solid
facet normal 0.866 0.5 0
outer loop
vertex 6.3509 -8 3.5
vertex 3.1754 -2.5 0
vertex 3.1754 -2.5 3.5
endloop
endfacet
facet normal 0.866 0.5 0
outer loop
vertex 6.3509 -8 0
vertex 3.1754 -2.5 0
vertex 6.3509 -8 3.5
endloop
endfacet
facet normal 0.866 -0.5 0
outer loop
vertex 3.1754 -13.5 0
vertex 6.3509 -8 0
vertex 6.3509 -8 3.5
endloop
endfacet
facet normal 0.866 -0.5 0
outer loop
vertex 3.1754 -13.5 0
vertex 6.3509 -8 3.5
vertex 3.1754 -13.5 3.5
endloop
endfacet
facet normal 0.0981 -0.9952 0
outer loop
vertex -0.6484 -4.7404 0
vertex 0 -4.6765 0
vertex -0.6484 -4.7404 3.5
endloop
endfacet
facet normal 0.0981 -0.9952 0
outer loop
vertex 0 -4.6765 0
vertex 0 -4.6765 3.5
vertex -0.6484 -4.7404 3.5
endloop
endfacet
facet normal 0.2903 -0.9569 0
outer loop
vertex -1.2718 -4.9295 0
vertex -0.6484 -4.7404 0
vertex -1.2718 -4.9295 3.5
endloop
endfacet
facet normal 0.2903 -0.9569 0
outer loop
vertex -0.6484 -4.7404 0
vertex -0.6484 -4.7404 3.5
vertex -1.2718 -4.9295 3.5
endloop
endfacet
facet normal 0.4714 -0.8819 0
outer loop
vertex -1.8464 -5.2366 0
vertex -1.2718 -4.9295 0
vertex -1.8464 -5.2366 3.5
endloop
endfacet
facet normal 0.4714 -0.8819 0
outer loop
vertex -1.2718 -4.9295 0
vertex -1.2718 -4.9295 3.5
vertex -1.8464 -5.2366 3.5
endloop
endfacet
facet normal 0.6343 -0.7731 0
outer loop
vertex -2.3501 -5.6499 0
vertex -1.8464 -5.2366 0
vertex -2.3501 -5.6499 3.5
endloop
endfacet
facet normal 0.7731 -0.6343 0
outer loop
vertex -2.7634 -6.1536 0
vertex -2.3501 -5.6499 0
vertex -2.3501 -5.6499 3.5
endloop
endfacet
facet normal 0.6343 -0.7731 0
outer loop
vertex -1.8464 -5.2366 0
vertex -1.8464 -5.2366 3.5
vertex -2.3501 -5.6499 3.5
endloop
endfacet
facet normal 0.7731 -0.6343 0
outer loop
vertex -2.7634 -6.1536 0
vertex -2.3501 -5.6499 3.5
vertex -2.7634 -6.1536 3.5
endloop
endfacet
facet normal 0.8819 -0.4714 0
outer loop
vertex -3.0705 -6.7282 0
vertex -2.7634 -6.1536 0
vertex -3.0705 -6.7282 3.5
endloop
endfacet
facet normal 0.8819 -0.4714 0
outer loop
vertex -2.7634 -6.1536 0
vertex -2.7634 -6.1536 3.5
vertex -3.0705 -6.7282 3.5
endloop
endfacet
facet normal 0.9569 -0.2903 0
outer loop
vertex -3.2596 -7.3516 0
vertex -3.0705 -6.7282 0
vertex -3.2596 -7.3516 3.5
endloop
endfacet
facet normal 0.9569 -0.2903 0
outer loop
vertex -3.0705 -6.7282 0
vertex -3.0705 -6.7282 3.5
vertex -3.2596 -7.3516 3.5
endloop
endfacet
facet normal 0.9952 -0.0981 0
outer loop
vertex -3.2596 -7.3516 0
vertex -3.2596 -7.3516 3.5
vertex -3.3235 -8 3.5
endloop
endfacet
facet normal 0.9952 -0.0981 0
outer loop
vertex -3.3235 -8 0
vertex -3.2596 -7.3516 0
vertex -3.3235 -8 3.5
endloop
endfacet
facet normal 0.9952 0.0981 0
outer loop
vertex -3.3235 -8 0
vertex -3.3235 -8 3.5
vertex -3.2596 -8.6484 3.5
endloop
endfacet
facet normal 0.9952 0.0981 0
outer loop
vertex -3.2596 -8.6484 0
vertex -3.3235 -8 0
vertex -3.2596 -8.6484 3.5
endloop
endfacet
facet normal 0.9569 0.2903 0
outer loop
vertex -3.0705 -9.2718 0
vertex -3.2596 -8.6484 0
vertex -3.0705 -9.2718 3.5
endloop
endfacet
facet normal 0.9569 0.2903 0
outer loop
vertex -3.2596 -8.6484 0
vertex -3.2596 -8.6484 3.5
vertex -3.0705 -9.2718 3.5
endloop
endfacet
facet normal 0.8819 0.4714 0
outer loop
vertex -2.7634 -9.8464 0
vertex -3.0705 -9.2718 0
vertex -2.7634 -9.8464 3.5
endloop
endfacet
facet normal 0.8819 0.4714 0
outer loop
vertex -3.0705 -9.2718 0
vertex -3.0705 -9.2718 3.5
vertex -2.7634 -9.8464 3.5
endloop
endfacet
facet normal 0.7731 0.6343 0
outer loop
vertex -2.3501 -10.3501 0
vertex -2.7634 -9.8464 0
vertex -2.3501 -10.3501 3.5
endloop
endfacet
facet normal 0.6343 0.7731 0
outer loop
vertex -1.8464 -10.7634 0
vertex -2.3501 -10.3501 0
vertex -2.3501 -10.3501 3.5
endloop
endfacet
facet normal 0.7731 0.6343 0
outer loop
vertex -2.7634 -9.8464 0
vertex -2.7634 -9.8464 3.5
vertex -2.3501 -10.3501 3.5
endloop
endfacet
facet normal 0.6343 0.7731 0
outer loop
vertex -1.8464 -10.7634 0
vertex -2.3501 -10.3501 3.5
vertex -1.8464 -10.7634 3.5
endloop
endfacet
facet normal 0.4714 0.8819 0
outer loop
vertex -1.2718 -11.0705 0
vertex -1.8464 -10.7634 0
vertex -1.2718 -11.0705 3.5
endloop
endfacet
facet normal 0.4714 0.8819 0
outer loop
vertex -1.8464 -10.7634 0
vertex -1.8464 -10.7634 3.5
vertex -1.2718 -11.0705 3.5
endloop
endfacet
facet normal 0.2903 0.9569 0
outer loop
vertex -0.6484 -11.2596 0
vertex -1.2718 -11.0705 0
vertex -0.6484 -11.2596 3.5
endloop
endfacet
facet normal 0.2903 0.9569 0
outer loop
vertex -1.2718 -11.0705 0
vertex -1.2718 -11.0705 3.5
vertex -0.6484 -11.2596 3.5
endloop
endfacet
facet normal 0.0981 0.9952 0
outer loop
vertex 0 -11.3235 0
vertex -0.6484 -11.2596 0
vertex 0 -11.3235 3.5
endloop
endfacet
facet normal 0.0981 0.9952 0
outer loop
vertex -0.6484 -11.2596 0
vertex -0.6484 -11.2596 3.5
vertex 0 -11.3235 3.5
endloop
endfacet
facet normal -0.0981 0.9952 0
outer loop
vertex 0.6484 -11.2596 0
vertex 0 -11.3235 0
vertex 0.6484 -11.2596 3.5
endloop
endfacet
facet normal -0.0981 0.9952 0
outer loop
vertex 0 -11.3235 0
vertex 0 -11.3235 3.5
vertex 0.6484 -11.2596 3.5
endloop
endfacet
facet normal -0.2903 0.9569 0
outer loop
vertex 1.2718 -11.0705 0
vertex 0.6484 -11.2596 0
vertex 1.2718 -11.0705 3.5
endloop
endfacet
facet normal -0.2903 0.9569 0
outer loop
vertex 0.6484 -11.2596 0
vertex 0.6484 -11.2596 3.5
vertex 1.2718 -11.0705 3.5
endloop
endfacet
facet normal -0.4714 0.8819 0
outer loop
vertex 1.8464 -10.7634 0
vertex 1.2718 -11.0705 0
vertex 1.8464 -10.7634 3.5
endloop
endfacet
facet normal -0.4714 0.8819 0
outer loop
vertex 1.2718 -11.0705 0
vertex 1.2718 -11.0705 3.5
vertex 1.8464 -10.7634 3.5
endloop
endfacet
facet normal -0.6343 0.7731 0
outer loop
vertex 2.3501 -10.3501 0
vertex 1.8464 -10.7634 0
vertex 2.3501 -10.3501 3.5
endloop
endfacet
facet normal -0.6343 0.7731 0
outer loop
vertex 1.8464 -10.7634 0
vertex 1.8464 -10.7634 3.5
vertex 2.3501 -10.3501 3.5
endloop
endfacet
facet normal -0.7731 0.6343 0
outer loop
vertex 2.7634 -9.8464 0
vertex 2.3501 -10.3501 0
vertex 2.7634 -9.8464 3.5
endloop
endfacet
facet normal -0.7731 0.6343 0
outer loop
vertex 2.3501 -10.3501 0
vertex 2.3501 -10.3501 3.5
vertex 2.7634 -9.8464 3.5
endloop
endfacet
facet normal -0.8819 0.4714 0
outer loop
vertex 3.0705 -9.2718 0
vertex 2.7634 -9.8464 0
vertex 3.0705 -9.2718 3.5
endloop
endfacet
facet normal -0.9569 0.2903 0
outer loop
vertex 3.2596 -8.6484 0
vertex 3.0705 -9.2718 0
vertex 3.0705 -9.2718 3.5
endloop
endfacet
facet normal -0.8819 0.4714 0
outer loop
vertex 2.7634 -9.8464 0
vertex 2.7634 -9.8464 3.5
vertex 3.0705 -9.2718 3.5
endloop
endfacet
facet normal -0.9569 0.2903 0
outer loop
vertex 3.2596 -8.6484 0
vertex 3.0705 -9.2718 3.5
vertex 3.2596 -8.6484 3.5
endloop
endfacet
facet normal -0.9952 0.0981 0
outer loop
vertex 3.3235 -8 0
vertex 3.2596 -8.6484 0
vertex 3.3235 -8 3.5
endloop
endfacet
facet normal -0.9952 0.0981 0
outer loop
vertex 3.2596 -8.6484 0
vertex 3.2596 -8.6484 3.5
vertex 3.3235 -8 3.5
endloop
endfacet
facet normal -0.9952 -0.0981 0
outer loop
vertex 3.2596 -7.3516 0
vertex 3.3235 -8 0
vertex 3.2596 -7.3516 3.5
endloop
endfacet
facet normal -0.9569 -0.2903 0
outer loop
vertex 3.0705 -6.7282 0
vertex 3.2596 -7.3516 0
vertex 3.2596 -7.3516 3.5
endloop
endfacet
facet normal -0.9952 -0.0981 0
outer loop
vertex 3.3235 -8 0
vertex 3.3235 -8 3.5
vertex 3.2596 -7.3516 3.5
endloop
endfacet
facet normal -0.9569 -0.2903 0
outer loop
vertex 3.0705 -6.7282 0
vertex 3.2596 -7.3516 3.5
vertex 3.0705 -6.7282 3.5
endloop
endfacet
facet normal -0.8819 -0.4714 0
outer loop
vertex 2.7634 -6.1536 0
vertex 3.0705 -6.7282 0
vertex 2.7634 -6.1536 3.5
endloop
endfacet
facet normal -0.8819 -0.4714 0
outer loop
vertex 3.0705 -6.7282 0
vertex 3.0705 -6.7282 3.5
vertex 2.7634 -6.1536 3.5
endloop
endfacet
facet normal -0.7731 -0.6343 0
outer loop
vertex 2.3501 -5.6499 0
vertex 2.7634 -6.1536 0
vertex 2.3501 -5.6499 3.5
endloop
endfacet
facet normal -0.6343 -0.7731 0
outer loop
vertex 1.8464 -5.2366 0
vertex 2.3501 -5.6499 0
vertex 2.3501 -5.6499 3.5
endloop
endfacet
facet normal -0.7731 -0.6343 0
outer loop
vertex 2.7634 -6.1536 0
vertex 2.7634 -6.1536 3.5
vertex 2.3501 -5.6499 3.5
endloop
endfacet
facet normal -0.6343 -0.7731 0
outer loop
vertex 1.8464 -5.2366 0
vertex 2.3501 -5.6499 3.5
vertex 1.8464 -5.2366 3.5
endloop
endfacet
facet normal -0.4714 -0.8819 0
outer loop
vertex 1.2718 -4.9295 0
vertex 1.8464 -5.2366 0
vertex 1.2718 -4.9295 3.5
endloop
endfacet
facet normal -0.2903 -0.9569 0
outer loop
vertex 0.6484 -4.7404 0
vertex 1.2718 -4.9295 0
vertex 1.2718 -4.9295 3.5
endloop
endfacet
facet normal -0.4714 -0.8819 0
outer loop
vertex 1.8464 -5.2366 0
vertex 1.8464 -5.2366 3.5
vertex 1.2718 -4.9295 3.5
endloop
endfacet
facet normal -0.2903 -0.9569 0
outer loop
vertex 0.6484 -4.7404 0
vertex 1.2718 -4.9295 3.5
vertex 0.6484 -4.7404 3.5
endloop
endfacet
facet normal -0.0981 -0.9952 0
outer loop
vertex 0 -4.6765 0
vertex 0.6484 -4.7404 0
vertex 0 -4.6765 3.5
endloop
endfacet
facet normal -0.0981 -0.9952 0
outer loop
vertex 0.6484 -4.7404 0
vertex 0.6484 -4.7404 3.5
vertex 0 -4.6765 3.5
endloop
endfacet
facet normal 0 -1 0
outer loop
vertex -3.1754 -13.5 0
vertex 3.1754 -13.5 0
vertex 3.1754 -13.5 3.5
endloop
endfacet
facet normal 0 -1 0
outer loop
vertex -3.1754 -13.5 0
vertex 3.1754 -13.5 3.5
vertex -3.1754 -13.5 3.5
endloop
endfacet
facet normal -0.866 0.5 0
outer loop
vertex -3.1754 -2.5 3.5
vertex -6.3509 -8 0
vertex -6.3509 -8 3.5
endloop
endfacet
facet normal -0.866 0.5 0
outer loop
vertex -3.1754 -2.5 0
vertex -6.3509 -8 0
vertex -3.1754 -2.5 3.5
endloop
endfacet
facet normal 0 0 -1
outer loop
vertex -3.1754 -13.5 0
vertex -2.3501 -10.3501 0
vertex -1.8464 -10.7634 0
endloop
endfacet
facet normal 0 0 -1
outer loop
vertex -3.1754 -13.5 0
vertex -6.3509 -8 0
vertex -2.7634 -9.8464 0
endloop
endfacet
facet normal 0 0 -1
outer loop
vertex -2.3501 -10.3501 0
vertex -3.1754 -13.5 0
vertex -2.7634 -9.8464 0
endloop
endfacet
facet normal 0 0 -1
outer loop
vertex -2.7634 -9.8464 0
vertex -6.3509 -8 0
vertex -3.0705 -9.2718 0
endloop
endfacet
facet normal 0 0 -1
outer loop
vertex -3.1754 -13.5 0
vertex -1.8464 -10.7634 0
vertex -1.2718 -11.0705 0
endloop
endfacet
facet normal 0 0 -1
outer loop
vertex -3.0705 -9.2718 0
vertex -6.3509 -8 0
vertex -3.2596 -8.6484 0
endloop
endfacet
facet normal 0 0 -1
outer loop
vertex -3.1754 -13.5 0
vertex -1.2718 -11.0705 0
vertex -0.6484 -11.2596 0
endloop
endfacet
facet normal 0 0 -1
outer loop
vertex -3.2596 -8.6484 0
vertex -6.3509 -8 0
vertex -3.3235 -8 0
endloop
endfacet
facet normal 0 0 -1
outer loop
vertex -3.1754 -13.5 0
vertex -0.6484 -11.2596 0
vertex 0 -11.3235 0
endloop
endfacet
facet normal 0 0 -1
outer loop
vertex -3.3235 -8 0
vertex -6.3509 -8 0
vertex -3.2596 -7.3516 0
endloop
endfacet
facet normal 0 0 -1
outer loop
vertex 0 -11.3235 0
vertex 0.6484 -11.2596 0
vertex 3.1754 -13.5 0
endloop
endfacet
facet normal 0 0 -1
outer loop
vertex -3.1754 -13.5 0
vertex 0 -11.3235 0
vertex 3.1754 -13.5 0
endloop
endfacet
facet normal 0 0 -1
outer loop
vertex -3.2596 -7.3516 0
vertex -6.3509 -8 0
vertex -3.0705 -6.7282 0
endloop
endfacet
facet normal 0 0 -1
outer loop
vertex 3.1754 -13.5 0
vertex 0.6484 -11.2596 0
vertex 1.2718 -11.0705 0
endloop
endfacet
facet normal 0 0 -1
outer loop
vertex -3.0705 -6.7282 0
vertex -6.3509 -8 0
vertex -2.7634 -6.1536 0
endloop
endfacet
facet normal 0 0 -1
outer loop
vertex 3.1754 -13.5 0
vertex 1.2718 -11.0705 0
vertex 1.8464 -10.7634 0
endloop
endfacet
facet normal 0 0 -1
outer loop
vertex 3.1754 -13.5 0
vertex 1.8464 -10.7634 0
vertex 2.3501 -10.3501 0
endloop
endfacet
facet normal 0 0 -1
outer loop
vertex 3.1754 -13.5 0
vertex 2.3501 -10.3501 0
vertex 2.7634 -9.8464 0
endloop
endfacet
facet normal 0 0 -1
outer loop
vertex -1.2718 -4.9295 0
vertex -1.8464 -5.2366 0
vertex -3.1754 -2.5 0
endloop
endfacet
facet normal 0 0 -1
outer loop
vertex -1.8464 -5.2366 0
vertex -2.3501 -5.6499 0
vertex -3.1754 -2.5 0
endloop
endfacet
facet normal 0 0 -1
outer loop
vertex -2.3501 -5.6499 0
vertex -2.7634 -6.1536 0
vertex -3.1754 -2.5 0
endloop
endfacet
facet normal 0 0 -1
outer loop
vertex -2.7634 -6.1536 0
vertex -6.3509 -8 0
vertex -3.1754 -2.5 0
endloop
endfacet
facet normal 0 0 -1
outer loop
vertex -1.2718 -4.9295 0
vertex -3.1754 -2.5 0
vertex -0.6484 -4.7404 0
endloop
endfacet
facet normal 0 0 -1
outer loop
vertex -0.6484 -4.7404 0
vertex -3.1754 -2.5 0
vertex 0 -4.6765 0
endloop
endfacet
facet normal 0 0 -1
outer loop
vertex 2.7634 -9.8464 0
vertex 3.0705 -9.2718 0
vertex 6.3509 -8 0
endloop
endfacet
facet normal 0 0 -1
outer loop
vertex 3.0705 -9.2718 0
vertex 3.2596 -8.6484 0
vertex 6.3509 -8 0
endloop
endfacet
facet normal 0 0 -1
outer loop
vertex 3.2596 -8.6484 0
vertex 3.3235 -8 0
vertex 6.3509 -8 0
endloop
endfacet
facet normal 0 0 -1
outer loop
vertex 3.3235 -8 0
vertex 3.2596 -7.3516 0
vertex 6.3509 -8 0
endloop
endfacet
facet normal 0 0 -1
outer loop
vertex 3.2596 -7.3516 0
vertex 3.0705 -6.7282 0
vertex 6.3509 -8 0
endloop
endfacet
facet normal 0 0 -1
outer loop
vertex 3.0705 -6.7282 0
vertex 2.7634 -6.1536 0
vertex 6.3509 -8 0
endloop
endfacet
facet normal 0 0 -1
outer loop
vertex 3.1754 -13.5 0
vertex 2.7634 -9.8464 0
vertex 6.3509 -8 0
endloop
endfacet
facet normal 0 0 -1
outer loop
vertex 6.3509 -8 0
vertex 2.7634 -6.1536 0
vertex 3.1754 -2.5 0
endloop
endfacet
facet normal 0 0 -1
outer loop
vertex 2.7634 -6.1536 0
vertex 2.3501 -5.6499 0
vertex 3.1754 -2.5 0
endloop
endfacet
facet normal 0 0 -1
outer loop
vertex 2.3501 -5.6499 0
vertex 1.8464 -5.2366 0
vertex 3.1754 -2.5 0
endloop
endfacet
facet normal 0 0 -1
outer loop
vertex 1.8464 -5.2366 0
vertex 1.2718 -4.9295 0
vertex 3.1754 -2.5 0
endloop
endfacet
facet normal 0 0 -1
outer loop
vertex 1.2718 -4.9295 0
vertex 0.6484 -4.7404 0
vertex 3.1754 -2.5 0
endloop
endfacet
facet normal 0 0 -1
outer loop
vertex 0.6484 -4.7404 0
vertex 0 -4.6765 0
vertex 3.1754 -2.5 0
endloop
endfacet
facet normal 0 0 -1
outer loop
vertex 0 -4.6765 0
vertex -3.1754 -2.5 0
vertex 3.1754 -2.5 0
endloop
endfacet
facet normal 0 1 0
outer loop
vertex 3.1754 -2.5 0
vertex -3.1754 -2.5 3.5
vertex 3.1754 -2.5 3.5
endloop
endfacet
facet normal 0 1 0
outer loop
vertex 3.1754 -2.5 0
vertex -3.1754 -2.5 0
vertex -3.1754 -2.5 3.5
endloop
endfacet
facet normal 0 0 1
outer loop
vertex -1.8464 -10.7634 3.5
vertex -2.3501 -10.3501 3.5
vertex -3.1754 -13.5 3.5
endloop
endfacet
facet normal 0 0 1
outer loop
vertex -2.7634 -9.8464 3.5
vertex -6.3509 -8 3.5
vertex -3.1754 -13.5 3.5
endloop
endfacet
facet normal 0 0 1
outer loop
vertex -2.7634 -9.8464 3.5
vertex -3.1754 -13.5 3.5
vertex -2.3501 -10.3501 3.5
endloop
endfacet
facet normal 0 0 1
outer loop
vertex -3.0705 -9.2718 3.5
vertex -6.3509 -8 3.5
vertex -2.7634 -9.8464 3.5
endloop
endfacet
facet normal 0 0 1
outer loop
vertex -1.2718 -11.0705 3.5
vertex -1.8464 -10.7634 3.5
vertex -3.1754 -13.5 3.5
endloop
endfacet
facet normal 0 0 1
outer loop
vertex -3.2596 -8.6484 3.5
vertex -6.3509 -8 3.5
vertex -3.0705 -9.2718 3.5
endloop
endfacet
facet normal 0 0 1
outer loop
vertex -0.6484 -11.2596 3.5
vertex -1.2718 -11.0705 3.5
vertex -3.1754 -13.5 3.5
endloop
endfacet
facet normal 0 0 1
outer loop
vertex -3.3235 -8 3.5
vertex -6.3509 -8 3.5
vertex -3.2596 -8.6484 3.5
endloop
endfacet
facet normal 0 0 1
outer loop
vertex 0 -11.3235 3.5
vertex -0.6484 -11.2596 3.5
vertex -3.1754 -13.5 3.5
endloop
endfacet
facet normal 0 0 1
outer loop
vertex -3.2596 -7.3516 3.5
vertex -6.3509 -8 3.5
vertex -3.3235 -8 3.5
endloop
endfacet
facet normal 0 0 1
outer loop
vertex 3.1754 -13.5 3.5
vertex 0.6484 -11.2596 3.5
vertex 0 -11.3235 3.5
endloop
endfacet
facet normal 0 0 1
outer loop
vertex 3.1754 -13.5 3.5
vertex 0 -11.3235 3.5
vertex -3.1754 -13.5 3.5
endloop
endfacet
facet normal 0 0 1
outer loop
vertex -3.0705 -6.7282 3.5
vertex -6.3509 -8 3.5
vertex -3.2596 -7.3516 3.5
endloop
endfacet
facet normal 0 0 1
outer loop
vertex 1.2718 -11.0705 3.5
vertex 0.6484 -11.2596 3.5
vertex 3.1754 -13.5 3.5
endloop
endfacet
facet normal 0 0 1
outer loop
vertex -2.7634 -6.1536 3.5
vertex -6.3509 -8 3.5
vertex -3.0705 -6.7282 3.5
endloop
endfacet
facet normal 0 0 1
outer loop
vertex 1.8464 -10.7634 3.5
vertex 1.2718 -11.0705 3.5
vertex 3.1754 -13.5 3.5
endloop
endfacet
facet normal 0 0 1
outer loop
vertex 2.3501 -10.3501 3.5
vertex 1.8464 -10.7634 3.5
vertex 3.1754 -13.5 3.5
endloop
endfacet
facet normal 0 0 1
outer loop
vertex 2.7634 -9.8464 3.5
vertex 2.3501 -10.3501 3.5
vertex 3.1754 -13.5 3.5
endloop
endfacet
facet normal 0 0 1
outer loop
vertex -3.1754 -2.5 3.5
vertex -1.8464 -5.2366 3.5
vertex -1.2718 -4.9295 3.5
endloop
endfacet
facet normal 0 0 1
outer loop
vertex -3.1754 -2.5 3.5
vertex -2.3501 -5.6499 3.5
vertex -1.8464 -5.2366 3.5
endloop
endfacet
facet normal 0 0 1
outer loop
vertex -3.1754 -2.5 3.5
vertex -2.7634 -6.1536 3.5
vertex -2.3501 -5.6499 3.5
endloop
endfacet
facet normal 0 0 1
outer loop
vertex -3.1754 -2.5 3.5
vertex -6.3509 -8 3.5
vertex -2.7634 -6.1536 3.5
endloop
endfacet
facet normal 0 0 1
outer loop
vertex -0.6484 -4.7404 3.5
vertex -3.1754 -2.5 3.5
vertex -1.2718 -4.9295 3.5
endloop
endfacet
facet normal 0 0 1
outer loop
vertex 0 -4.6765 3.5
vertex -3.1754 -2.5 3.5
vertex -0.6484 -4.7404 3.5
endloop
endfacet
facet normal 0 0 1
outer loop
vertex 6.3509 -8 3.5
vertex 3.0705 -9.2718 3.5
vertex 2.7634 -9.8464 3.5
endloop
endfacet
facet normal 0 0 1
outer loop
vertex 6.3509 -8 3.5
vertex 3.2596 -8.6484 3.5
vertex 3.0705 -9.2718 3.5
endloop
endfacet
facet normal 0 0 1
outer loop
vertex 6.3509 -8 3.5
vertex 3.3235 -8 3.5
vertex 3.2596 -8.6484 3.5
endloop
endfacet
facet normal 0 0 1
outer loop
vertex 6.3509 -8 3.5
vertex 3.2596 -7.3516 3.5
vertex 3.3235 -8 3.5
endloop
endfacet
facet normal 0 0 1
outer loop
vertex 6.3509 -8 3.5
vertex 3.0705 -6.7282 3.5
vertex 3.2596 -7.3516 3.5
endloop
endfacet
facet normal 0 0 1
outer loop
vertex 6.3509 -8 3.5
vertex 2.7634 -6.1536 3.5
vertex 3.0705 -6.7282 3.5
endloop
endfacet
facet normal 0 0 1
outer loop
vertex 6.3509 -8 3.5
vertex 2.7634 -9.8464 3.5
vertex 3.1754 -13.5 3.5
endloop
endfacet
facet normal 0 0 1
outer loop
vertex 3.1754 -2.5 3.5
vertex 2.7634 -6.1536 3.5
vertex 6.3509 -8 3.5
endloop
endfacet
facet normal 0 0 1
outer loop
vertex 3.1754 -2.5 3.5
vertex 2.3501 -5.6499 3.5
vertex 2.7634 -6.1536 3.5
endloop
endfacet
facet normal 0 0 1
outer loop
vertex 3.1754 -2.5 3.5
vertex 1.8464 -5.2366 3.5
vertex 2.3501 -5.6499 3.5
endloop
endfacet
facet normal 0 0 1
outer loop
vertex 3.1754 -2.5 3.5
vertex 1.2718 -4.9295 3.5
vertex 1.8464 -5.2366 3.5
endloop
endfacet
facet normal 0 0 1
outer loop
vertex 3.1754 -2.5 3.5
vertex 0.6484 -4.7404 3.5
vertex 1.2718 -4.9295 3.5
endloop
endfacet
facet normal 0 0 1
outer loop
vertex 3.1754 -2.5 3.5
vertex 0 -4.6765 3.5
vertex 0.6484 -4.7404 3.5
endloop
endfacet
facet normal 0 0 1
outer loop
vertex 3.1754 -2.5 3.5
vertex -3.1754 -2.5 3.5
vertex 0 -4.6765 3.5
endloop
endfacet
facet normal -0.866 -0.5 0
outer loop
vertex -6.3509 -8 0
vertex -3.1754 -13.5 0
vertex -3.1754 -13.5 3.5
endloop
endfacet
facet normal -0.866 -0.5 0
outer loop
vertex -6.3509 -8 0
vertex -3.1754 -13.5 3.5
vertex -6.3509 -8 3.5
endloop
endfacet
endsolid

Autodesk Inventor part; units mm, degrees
ref_plane "YZ Plane" through (0, 0, 0) normal (1, 0, 0) x (0, 1, 0)
ref_plane "XZ Plane" through (0, 0, 0) normal (0, 1, 0) x (-1, 0, 0)
ref_plane "XY Plane" through (0, 0, 0) normal (0, 0, 1) x (1, 0, 0)
sketch "Sketch1" plane through (0, 0, 0) normal (0, 0, 1) x (1, 0, 0)
  line L0 (0, 0) -> (0, -16) construction
  line L1 (-3.1754, -13.5) -> (-6.3509, -8)
  line L2 (-6.3509, -8) -> (-3.1754, -2.5)
  line L3 (-3.1754, -2.5) -> (3.1754, -2.5)
  line L4 (3.1754, -2.5) -> (6.3509, -8)
  line L5 (6.3509, -8) -> (3.1754, -13.5)
  line L6 (3.1754, -13.5) -> (-3.1754, -13.5)
  point P0 (0, -8)
  point P1 (0, -2.5)
  point P2 (-4.7631, -5.25)
  dimension "d0" = 11
extrude "Extrusion1" add sketch "Sketch1" along normal blind 3.5
hole "Hole1" at (0, -8, 0) direction (0, 0, 1) diameter 6.647 end through all thread size "M8x1.25" class "6H" standard "ANSI Metric M Profile"
properties part number "HUDSON-1-89A"
